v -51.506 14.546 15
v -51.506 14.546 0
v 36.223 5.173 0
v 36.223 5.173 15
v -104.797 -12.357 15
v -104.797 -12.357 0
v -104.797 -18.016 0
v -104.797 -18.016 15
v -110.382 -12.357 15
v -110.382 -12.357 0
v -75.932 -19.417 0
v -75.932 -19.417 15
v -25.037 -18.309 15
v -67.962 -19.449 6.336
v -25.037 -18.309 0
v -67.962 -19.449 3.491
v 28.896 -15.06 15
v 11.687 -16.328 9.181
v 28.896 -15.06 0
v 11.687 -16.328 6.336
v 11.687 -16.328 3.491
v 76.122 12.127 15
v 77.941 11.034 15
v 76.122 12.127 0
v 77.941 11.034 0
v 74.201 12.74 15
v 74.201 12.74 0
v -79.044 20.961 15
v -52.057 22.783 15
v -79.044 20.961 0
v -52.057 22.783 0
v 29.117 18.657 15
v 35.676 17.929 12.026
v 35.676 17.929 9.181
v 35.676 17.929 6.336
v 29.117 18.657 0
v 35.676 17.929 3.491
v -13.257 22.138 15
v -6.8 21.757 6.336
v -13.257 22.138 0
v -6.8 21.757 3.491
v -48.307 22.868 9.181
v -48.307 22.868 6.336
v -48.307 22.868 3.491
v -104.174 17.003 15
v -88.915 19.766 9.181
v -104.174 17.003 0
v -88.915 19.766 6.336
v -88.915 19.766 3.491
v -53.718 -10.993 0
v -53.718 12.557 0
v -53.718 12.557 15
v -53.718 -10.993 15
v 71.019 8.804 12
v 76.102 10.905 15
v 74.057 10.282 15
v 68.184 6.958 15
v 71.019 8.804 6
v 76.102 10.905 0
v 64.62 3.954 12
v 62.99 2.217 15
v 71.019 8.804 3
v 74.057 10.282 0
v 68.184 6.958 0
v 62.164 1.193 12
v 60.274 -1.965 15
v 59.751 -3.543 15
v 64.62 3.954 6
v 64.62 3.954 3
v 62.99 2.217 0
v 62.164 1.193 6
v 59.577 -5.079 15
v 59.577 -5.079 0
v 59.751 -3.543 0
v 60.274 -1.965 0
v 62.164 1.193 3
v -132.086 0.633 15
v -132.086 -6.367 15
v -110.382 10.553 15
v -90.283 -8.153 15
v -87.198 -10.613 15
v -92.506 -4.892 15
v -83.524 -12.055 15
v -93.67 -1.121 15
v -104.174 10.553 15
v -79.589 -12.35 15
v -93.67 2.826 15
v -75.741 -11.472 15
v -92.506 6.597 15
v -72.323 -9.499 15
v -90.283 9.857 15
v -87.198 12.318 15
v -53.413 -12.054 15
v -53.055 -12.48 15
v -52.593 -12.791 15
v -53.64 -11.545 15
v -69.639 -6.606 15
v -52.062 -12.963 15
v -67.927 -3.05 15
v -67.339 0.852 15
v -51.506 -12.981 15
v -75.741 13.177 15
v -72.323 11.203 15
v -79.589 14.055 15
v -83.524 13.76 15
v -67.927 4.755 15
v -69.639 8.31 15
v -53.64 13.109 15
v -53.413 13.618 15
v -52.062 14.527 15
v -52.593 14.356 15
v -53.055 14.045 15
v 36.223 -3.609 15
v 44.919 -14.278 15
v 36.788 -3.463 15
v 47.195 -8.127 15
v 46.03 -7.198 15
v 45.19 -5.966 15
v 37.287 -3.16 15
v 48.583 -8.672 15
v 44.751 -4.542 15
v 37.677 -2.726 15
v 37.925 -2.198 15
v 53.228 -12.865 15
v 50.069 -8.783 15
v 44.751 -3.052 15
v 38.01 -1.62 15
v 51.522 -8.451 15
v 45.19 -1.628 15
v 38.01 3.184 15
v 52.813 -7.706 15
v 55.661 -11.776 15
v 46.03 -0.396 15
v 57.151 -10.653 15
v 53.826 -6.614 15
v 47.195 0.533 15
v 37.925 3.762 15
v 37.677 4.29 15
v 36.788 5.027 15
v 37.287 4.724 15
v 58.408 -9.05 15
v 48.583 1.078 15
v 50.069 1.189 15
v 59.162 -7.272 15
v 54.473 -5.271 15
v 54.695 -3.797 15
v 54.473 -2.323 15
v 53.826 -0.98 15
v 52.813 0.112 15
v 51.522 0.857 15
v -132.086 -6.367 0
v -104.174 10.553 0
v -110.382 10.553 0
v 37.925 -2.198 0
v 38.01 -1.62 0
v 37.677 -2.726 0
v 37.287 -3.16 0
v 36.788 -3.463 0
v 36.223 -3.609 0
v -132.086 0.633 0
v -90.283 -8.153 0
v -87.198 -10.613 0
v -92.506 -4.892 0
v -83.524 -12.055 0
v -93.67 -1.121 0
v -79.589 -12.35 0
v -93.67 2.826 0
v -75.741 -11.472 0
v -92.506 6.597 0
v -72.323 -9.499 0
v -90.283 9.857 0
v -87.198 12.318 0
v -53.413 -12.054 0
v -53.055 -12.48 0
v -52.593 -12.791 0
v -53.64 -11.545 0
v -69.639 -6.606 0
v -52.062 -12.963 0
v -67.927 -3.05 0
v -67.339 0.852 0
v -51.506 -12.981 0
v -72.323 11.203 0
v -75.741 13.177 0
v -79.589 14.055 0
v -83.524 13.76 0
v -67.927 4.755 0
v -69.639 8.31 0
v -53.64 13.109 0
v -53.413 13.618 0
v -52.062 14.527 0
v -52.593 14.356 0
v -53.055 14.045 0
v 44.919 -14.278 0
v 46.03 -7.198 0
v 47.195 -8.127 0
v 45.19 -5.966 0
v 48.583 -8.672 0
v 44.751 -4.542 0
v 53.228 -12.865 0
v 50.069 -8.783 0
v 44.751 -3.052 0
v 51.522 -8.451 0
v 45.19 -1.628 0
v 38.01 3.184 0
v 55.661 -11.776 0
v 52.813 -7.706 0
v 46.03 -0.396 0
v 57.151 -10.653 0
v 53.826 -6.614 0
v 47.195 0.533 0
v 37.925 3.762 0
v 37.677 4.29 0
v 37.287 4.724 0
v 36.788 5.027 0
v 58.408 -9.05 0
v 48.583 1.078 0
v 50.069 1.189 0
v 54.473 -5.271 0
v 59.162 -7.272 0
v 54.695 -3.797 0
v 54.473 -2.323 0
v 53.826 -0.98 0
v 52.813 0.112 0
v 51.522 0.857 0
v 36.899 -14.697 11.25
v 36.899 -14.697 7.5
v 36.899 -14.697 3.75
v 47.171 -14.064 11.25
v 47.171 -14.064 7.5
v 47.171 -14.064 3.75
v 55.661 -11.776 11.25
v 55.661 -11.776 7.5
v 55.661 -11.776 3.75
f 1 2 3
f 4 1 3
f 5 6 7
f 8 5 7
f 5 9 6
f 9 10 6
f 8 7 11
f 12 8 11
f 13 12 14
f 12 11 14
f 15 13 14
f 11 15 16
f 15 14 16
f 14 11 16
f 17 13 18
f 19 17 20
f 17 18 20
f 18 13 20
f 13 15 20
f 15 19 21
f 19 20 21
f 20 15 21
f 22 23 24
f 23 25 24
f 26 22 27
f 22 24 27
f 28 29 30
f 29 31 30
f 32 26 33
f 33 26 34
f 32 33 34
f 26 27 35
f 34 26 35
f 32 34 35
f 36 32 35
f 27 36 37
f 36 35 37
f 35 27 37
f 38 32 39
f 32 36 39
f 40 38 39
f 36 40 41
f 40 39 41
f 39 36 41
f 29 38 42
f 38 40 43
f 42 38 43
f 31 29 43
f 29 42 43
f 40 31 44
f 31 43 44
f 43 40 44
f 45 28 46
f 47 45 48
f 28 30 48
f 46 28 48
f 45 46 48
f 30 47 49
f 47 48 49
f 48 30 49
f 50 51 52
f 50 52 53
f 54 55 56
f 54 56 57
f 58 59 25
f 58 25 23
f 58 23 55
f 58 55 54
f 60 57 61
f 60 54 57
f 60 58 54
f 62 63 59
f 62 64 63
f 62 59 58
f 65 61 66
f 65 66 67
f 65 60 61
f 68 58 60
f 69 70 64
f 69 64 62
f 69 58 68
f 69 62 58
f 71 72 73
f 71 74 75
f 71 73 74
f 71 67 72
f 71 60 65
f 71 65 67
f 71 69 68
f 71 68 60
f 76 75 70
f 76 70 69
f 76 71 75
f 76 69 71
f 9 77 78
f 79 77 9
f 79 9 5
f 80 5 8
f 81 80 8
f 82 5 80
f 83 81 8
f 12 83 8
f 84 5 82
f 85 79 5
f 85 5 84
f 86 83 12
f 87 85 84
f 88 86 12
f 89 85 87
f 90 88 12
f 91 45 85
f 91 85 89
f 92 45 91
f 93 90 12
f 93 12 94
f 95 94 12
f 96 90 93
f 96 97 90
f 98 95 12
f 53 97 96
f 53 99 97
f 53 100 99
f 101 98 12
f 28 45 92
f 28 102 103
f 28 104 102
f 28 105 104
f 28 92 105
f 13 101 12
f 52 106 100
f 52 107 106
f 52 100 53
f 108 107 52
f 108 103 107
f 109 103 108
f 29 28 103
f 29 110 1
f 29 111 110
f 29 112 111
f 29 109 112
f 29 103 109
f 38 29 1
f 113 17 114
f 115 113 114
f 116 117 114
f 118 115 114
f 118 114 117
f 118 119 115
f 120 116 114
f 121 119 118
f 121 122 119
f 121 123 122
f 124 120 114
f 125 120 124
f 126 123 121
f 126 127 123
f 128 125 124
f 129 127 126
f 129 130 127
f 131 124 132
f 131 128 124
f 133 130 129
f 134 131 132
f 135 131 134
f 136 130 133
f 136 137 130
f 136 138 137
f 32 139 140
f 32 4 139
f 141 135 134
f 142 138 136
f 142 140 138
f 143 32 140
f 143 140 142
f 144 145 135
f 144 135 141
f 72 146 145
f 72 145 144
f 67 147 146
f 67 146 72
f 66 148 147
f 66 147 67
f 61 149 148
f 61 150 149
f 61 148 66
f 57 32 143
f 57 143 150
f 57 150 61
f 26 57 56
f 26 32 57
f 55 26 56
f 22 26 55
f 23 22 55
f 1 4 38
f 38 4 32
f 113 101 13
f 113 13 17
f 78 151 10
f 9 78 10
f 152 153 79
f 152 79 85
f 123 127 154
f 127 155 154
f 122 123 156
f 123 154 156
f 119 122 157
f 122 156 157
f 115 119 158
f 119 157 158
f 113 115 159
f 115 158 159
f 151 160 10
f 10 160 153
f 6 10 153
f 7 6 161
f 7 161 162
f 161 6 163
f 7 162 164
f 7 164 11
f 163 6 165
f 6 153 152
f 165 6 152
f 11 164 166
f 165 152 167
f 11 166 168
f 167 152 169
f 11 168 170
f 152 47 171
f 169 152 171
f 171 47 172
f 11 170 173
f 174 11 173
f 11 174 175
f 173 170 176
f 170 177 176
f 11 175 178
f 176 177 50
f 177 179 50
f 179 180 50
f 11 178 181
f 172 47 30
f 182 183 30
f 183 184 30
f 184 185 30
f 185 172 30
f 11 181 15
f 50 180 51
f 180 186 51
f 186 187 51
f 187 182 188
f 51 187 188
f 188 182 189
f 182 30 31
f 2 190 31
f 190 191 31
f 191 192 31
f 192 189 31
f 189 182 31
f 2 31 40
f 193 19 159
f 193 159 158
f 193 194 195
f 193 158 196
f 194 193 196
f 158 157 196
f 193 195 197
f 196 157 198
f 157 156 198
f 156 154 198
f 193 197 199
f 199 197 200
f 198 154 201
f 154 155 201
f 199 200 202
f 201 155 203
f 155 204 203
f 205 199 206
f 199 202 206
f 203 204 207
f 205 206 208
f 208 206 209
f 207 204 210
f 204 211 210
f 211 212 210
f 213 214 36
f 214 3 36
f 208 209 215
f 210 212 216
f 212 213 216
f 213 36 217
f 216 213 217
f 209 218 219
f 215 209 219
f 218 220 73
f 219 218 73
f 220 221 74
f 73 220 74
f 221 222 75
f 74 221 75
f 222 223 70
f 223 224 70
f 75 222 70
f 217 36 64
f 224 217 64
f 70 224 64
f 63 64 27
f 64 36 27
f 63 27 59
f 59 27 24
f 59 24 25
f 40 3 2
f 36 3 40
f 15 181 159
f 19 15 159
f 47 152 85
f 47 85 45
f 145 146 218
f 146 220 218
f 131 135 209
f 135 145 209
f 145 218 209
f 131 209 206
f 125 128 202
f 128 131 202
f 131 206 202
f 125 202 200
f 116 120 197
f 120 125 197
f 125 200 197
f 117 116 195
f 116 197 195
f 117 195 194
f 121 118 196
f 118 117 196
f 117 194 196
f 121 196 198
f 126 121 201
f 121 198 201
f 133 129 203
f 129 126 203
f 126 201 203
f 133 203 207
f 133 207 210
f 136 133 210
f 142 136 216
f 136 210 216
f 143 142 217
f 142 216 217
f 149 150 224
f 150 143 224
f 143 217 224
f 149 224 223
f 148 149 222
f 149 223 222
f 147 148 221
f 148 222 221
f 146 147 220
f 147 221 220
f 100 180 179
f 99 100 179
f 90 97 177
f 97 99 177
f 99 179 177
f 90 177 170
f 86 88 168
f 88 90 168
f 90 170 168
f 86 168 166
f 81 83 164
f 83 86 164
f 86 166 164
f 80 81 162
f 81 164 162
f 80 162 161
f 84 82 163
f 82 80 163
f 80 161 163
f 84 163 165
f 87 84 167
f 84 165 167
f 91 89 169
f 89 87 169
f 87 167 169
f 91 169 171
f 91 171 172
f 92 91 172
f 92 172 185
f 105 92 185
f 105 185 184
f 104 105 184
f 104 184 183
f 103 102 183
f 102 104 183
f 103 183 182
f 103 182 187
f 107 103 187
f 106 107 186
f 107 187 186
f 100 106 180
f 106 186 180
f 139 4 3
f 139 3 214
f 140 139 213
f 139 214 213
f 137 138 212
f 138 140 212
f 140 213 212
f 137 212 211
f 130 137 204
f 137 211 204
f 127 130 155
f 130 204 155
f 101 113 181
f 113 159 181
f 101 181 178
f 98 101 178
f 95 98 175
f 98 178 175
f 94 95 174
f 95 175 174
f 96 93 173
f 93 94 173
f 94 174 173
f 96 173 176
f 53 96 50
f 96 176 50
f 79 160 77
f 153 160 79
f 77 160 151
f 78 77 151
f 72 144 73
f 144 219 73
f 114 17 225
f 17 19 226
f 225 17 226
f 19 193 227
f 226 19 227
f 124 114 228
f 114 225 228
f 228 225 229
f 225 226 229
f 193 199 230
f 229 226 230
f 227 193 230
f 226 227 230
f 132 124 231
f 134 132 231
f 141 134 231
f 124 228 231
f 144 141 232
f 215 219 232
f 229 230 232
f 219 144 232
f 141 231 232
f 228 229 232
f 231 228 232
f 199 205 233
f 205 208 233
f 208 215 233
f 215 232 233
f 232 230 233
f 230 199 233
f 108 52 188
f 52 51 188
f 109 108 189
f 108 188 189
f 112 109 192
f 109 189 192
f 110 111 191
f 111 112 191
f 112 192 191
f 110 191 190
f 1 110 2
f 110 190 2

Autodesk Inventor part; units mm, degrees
ref_plane "YZ Plane" through (0, 0, 0) normal (1, 0, 0) x (0, 1, 0)
ref_plane "XZ Plane" through (0, 0, 0) normal (0, 1, 0) x (-1, 0, 0)
ref_plane "XY Plane" through (0, 0, 0) normal (0, 0, 1) x (1, 0, 0)
sketch "Sketch3" plane through (0, 0, 0) normal (0, 0, 1) x (1, 0, 0)
  line L0 (-80.5781, 0.8523) -> (-80.5781, 20.7988) construction
  circle A0 centre (-80.5781, 0.8523) radius 13.2395
  line L1 (-53.718, 12.5571) -> (-53.718, -10.9927)
  arc A1 (-53.718, -10.9927) -> (-51.5055, -12.9814) centre (-51.718, -10.9927) ccw
  arc A2 (-51.5055, 14.5458) -> (-53.718, 12.5571) centre (-51.718, 12.5571) ccw
  line L2 (36.2228, -3.6088) -> (-51.5055, -12.9814)
  line L3 (38.0103, 3.1845) -> (38.0103, -1.6201)
  line L4 (-80.5781, 0.8523) -> (49.5525, 0.8523) construction
  circle A3 centre (49.6953, -3.797) radius 5
  line L5 (59.6953, 14.884) -> (59.6953, -12.7998) construction
  spline S0 degree 4 poles (77.9414, 11.0338) (75.5683, 12.9654) (71.7145, 13.0272) (66.8099, 13.9036) (60.7685, 14.7338) (56.2959, 15.3578) (51.7728, 15.9509) (47.2242, 16.5426) (42.6244, 17.1111) (37.9974, 17.6651) (33.3378, 18.1987) (28.6546, 18.7114) (23.9504, 19.2026) (19.2309, 19.6699) (14.5002, 20.1135) (9.7632, 20.5291) (5.025, 20.9191) (0.2903, 21.2792) (-4.4372, 21.6095) (-9.151, 21.9092) (-13.8524, 22.1766) (-18.5268, 22.4102) (-23.2002, 22.6105) (-27.8558, 22.7627) (-32.4748, 22.8704) (-37.0553, 22.9312) (-41.5904, 22.9454) (-46.0738, 22.9127) (-50.5027, 22.8323) (-54.8678, 22.7052) (-59.1755, 22.5324) (-63.394, 22.3084) (-67.5752, 22.0492) (-71.5451, 21.7209) (-75.7777, 21.4072) (-79.04, 20.9063) (-83.4863, 20.5541) (-87.0067, 20.037) (-90.7113, 19.5168) (-94.2172, 18.9459) (-97.6363, 18.3426) (-100.9342, 17.7015) (-104.1216, 17.0263) (-107.1909, 16.3187) (-110.1396, 15.5797) (-112.9656, 14.8117) (-115.6652, 14.0172) (-118.2357, 13.1965) (-120.6759, 12.3541) (-122.9817, 11.4895) (-125.1529, 10.6071) (-127.1857, 9.7065) (-129.0794, 8.7914) (-130.8324, 7.8633) (-132.4429, 6.923) (-133.9096, 5.9737) (-135.2322, 5.016) (-136.4083, 4.0508) (-137.4392, 3.0816) (-138.3215, 2.1025) (-139.0592, 1.1321) (-139.6407, 0.1249) (-140.106, -0.8362) (-140.3589, -2.0477) (-140.602, -2.598) (-140.1166, -5.4607) (-140.0539, -5.4622) (-139.4639, -6.7645) (-138.8842, -7.4979) (-138.1173, -8.3934) (-137.2199, -9.1877) (-136.1721, -9.9852) (-134.9893, -10.738) (-133.6669, -11.4655) (-132.2091, -12.1599) (-130.6156, -12.8245) (-128.8897, -13.4579) (-127.0312, -14.0591) (-125.0439, -14.6296) (-122.9287, -15.1678) (-120.6879, -15.6738) (-118.3241, -16.1476) (-115.8396, -16.5892) (-113.2366, -16.9984) (-110.5176, -17.3742) (-107.6861, -17.7183) (-104.7439, -18.0297) (-101.6943, -18.3095) (-98.5398, -18.5568) (-95.2843, -18.7732) (-91.9297, -18.9579) (-88.48, -19.1131) (-84.9381, -19.2376) (-81.3071, -19.3341) (-77.5906, -19.4015) (-73.7915, -19.4421) (-69.9139, -19.4561) (-65.961, -19.445) (-61.9362, -19.4102) (-57.8434, -19.3518) (-53.6861, -19.2727) (-49.4679, -19.1731) (-45.1932, -19.0538) (-40.8649, -18.9183) (-36.4879, -18.766) (-32.0649, -18.5992) (-27.598, -18.4192) (-23.0941, -18.227) (-18.5434, -18.0273) (-13.9382, -17.8076) (-9.3141, -17.5719) (-4.666, -17.3195) (-0.0002, -17.052) (4.6675, -16.7728) (9.3655, -16.4759) (14.0236, -16.1832) (19.545, -15.7815) (23.3079, -15.6072) (27.1098, -15.1781) (28.8959, -15.0599) knots 0 0 0 0 0 0.024672 0.034555 0.0445 0.054495 0.064543 0.074632 0.084755 0.094911 0.105094 0.115299 0.125521 0.135755 0.145995 0.156237 0.166475 0.176705 0.186921 0.197118 0.207299 0.217463 0.227605 0.23772 0.247796 0.257824 0.267798 0.277713 0.287563 0.297345 0.307053 0.31668 0.326224 0.335555 0.344908 0.354162 0.363308 0.372467 0.381393 0.390196 0.398872 0.407415 0.41582 0.424082 0.432193 0.44015 0.447945 0.455574 0.46303 0.470307 0.477401 0.484305 0.491015 0.497525 0.503831 0.509931 0.515822 0.521506 0.526986 0.53227 0.537373 0.542316 0.547131 0.552525 0.557529 0.562533 0.567581 0.57205 0.576988 0.582082 0.587354 0.592817 0.598478 0.604341 0.610406 0.616671 0.623133 0.629789 0.636632 0.643658 0.650861 0.658236 0.665777 0.673478 0.681333 0.689338 0.697486 0.705771 0.71419 0.722736 0.731403 0.740188 0.749084 0.758087 0.767192 0.776393 0.785687 0.795067 0.804529 0.814069 0.823682 0.833362 0.843106 0.852907 0.862763 0.872667 0.88262 0.892624 0.902675 0.912766 0.92289 0.933033 0.943191 0.953358 0.963531 0.973703 0.984092 1 1 1 1 1
  line L6 (7.5013, -16.4763) -> (50.2906, -13.6435) construction
  arc A4 (44.8353, -17.2546) -> (13.385, -19.3367) centre (31.5327, -54.8885) ccw construction
  line L7 (159.6953, -3.8066) -> (59.6953, -3.8066) construction
  line L8 (-51.5055, 14.5458) -> (36.2228, 5.1732)
  arc A5 (36.2228, -3.6088) -> (38.0103, -1.6201) centre (36.0103, -1.6201) ccw
  arc A6 (38.0103, 3.1845) -> (36.2228, 5.1732) centre (36.0103, 3.1845) ccw
  spline S1 degree 4 poles (78.1029, 11.0141) (76.6463, 11.2227) (73.9909, 10.5042) (70.2765, 8.6041) (66.0429, 5.3938) (62.3889, 1.8499) (60.314, -1.2467) (59.5572, -3.5763) (59.5773, -5.0793) knots 0 0 0 0 0 0.302475 0.43895 0.576633 0.708802 1 1 1 1 1
  spline S2 degree 4 poles (28.8959, -15.0599) (34.0984, -14.7105) (49.269, -14.182) (58.5645, -15.239) (59.5773, -5.0793) knots 0 0 0 0 0 1 1 1 1 1
  line L9 (28.8959, -15.0599) -> (34.0984, -14.7105) construction
  line L10 (34.0984, -14.7105) -> (49.269, -14.182) construction
  line L11 (49.269, -14.182) -> (58.5645, -15.239) construction
  line L12 (58.5645, -15.239) -> (59.5773, -5.0793) construction
  line L13 (-140.4646, -2.8394) -> (159.4818, -3.8173) construction
  line L14 (-132.0856, 0.6333) -> (-132.0856, -6.3667)
  line L15 (-132.0856, -6.3667) -> (-110.3816, -12.3574)
  line L16 (-110.3816, -12.3574) -> (-104.797, -12.3574)
  line L17 (-104.797, -12.3574) -> (-104.797, -18.0156)
  line L18 (-132.0856, 0.6333) -> (-110.3816, 10.553)
  line L19 (-110.3816, 10.553) -> (-104.1736, 10.553)
  line L20 (-104.1736, 10.553) -> (-104.1736, 17.0026)
  point P0 (0, 0)
  point P1 (17.6589, 23.5628)
  point P2 (75.883, 10.8572)
  point P3 (72.8647, 9.7686)
  point P4 (69.4179, 7.8149)
  point P5 (66.0452, 5.2617)
  point P6 (63.1887, 2.4463)
  point P7 (61.1228, -0.3317)
  point P8 (59.9357, -2.8689)
  point P9 (-160.0931, -3.8671)
  point P10 (28.8959, -15.0599)
  point P11 (69.5533, 13.4647)
  point P12 (65.1899, 14.1023)
  point P13 (60.7936, 14.7318)
  point P14 (56.3207, 15.3468)
  point P15 (51.7945, 15.947)
  point P16 (47.2398, 16.5346)
  point P17 (42.6414, 17.1053)
  point P18 (38.0104, 17.6585)
  point P19 (33.3491, 18.1925)
  point P20 (28.6632, 18.7055)
  point P21 (23.9568, 19.1966)
  point P22 (19.2348, 19.6643)
  point P23 (14.5017, 20.1074)
  point P24 (9.7623, 20.5238)
  point P25 (5.0217, 20.9132)
  point P26 (0.2844, 21.2735)
  point P27 (-4.4451, 21.6038)
  point P28 (-9.1614, 21.9032)
  point P29 (-13.86, 22.1702)
  point P30 (-18.5361, 22.4036)
  point P31 (-23.211, 22.601)
  point P32 (-27.8721, 22.754)
  point P33 (-32.4966, 22.8611)
  point P34 (-37.0797, 22.9217)
  point P35 (-41.6169, 22.9356)
  point P36 (-46.1028, 22.9023)
  point P37 (-50.5329, 22.8216)
  point P38 (-54.9021, 22.6941)
  point P39 (-59.2065, 22.5195)
  point P40 (-63.4406, 22.2977)
  point P41 (-67.6008, 22.0302)
  point P42 (-71.6806, 21.7165)
  point P43 (-75.6814, 21.3591)
  point P44 (-79.1834, 20.9458)
  point P45 (-83.4048, 20.5095)
  point P46 (-87.1309, 20.023)
  point P47 (-90.7527, 19.494)
  point P48 (-94.2725, 18.9266)
  point P49 (-97.6845, 18.3211)
  point P50 (-100.9861, 17.6791)
  point P51 (-107.2438, 16.2934)
  point P52 (-110.1931, 15.553)
  point P53 (-113.0194, 14.7835)
  point P54 (-115.7191, 13.987)
  point P55 (-118.2898, 13.165)
  point P56 (-120.7294, 12.3201)
  point P57 (-123.0349, 11.454)
  point P58 (-125.2048, 10.569)
  point P59 (-127.2364, 9.6666)
  point P60 (-129.1282, 8.7491)
  point P61 (-130.8786, 7.8185)
  point P62 (-132.486, 6.8762)
  point P63 (-133.9488, 5.9245)
  point P64 (-135.2661, 4.9648)
  point P65 (-136.4363, 3.9987)
  point P66 (-137.4592, 3.0275)
  point P67 (-138.3336, 2.0531)
  point P68 (-139.0591, 1.0763)
  point P69 (-139.6352, 0.0983)
  point P70 (-140.0613, -0.8802)
  point P71 (-140.338, -1.8576)
  point P72 (-140.1239, -5.2398)
  point P73 (-139.9547, -5.7022)
  point P74 (-139.492, -6.6066)
  point P75 (-138.8844, -7.4823)
  point P76 (-138.1328, -8.3292)
  point P77 (-137.2384, -9.147)
  point P78 (-136.202, -9.9355)
  point P79 (-135.0249, -10.6943)
  point P80 (-133.7085, -11.4228)
  point P81 (-132.2548, -12.1206)
  point P82 (-130.6648, -12.7879)
  point P83 (-128.941, -13.4239)
  point P84 (-127.0846, -14.0282)
  point P85 (-125.0983, -14.6009)
  point P86 (-122.9839, -15.1415)
  point P87 (-120.7435, -15.6497)
  point P88 (-118.3798, -16.1256)
  point P89 (-115.8952, -16.569)
  point P90 (-113.2918, -16.9797)
  point P91 (-110.5723, -17.3574)
  point P92 (-107.74, -17.7027)
  point P93 (-101.7463, -18.2964)
  point P94 (-98.5909, -18.5451)
  point P95 (-95.3341, -18.7623)
  point P96 (-91.9783, -18.9484)
  point P97 (-88.5271, -19.1041)
  point P98 (-84.9838, -19.2298)
  point P99 (-81.3514, -19.3267)
  point P100 (-77.6332, -19.3951)
  point P101 (-73.8324, -19.4362)
  point P102 (-69.9531, -19.4509)
  point P103 (-65.9985, -19.4404)
  point P104 (-61.9719, -19.4059)
  point P105 (-57.8772, -19.3483)
  point P106 (-53.718, -19.2694)
  point P107 (-49.4979, -19.1701)
  point P108 (-45.2211, -19.0516)
  point P109 (-40.8909, -18.916)
  point P110 (-36.5118, -18.7642)
  point P111 (-32.0871, -18.5977)
  point P112 (-27.6213, -18.418)
  point P113 (-23.1183, -18.2269)
  point P114 (-18.5646, -18.0247)
  point P115 (-13.9566, -17.8054)
  point P116 (-9.3252, -17.5693)
  point P117 (-4.674, -17.317)
  point P118 (-0.0078, -17.05)
  point P119 (4.6686, -16.7695)
  point P120 (9.3513, -16.477)
  point P121 (14.0352, -16.1731)
  point P122 (18.7161, -15.8596)
  point P123 (23.3889, -15.5371)
  point P124 (78.0825, 12.164)
  point P125 (159.2574, -3.8401)
  point P126 (158.8836, -3.8779)
  point P127 (158.3607, -3.9307)
  point P128 (157.6896, -3.9985)
  point P129 (156.8706, -4.081)
  point P130 (155.9046, -4.1779)
  point P131 (154.7931, -4.2892)
  point P132 (153.5367, -4.4143)
  point P133 (152.1372, -4.5532)
  point P134 (150.5955, -4.7056)
  point P135 (148.914, -4.8712)
  point P136 (147.0936, -5.0494)
  point P137 (145.137, -5.2399)
  point P138 (143.0457, -5.4421)
  point P139 (140.8221, -5.6563)
  point P140 (138.4686, -5.8813)
  point P141 (135.9876, -6.1174)
  point P142 (133.3815, -6.3634)
  point P143 (130.6533, -6.6196)
  point P144 (127.8054, -6.8851)
  point P145 (124.8414, -7.1596)
  point P146 (121.7634, -7.4428)
  point P147 (118.5756, -7.7341)
  point P148 (115.2804, -8.0332)
  point P149 (111.8817, -8.3395)
  point P150 (108.3828, -8.6527)
  point P151 (104.787, -8.9722)
  point P152 (101.0985, -9.2974)
  point P153 (97.3206, -9.6283)
  point P154 (93.4572, -9.9643)
  point P155 (89.5122, -10.3048)
  point P156 (85.4898, -10.6492)
  point P157 (81.3936, -10.9969)
  point P158 (77.2284, -11.3479)
  point P159 (72.9975, -11.701)
  point P160 (68.7057, -12.0556)
  point P161 (64.3572, -12.4117)
  point P162 (59.9559, -12.7678)
  point P163 (55.5069, -13.1239)
  point P164 (51.0138, -13.4788)
  point P165 (46.4817, -13.8316)
  point P166 (41.9148, -14.182)
  point P167 (35.7035, -14.3277)
  point P168 (32.6946, -14.8708)
  point P169 (82.2459, 11.5043)
  point P170 (86.3364, 10.8401)
  point P171 (90.3495, 10.1732)
  point P172 (94.2816, 9.5051)
  point P173 (98.1288, 8.837)
  point P174 (101.8872, 8.171)
  point P175 (105.5538, 7.5086)
  point P176 (109.1244, 6.8507)
  point P177 (112.596, 6.1997)
  point P178 (115.9653, 5.5565)
  point P179 (119.2287, 4.9229)
  point P180 (122.3835, 4.3007)
  point P181 (125.4264, 3.6911)
  point P182 (128.3547, 3.0956)
  point P183 (131.1654, 2.5157)
  point P184 (133.8561, 1.9532)
  point P185 (136.4244, 1.4093)
  point P186 (138.8676, 0.8855)
  point P187 (141.1833, 0.383)
  point P188 (143.3697, -0.0964)
  point P189 (145.4247, -0.5518)
  point P190 (147.3462, -0.9817)
  point P191 (149.1327, -1.3852)
  point P192 (150.7821, -1.7608)
  point P193 (152.2935, -2.1073)
  point P194 (153.6651, -2.4241)
  point P195 (154.8954, -2.7103)
  point P196 (155.9838, -2.9647)
  point P197 (156.9291, -3.187)
  point P198 (157.7307, -3.376)
  point P199 (158.3871, -3.5317)
  dimension "d3" = 26.479
  dimension "d6" = 10
  dimension "d7" = 110
  dimension "d8" = 100
  dimension "d9" = 2
  dimension "d11" = 4.6493
  dimension "d25" = 7
  dimension "d26" = 3.5
  dimension "d27" = 8.379
  dimension "d28" = 30.083
  dimension "d29" = 5
  dimension "d30" = 5
  dimension "d32" = 59.8865
extrude "Extrusion2" add sketch "Sketch3" along normal blind 15 contours S1 S2 S0 L17 L16 L15 L14 L18 L19 L20
properties part number "3P.03.09.02.JS.rib 9 foam_CPY" material "Polyurethane Foam"
